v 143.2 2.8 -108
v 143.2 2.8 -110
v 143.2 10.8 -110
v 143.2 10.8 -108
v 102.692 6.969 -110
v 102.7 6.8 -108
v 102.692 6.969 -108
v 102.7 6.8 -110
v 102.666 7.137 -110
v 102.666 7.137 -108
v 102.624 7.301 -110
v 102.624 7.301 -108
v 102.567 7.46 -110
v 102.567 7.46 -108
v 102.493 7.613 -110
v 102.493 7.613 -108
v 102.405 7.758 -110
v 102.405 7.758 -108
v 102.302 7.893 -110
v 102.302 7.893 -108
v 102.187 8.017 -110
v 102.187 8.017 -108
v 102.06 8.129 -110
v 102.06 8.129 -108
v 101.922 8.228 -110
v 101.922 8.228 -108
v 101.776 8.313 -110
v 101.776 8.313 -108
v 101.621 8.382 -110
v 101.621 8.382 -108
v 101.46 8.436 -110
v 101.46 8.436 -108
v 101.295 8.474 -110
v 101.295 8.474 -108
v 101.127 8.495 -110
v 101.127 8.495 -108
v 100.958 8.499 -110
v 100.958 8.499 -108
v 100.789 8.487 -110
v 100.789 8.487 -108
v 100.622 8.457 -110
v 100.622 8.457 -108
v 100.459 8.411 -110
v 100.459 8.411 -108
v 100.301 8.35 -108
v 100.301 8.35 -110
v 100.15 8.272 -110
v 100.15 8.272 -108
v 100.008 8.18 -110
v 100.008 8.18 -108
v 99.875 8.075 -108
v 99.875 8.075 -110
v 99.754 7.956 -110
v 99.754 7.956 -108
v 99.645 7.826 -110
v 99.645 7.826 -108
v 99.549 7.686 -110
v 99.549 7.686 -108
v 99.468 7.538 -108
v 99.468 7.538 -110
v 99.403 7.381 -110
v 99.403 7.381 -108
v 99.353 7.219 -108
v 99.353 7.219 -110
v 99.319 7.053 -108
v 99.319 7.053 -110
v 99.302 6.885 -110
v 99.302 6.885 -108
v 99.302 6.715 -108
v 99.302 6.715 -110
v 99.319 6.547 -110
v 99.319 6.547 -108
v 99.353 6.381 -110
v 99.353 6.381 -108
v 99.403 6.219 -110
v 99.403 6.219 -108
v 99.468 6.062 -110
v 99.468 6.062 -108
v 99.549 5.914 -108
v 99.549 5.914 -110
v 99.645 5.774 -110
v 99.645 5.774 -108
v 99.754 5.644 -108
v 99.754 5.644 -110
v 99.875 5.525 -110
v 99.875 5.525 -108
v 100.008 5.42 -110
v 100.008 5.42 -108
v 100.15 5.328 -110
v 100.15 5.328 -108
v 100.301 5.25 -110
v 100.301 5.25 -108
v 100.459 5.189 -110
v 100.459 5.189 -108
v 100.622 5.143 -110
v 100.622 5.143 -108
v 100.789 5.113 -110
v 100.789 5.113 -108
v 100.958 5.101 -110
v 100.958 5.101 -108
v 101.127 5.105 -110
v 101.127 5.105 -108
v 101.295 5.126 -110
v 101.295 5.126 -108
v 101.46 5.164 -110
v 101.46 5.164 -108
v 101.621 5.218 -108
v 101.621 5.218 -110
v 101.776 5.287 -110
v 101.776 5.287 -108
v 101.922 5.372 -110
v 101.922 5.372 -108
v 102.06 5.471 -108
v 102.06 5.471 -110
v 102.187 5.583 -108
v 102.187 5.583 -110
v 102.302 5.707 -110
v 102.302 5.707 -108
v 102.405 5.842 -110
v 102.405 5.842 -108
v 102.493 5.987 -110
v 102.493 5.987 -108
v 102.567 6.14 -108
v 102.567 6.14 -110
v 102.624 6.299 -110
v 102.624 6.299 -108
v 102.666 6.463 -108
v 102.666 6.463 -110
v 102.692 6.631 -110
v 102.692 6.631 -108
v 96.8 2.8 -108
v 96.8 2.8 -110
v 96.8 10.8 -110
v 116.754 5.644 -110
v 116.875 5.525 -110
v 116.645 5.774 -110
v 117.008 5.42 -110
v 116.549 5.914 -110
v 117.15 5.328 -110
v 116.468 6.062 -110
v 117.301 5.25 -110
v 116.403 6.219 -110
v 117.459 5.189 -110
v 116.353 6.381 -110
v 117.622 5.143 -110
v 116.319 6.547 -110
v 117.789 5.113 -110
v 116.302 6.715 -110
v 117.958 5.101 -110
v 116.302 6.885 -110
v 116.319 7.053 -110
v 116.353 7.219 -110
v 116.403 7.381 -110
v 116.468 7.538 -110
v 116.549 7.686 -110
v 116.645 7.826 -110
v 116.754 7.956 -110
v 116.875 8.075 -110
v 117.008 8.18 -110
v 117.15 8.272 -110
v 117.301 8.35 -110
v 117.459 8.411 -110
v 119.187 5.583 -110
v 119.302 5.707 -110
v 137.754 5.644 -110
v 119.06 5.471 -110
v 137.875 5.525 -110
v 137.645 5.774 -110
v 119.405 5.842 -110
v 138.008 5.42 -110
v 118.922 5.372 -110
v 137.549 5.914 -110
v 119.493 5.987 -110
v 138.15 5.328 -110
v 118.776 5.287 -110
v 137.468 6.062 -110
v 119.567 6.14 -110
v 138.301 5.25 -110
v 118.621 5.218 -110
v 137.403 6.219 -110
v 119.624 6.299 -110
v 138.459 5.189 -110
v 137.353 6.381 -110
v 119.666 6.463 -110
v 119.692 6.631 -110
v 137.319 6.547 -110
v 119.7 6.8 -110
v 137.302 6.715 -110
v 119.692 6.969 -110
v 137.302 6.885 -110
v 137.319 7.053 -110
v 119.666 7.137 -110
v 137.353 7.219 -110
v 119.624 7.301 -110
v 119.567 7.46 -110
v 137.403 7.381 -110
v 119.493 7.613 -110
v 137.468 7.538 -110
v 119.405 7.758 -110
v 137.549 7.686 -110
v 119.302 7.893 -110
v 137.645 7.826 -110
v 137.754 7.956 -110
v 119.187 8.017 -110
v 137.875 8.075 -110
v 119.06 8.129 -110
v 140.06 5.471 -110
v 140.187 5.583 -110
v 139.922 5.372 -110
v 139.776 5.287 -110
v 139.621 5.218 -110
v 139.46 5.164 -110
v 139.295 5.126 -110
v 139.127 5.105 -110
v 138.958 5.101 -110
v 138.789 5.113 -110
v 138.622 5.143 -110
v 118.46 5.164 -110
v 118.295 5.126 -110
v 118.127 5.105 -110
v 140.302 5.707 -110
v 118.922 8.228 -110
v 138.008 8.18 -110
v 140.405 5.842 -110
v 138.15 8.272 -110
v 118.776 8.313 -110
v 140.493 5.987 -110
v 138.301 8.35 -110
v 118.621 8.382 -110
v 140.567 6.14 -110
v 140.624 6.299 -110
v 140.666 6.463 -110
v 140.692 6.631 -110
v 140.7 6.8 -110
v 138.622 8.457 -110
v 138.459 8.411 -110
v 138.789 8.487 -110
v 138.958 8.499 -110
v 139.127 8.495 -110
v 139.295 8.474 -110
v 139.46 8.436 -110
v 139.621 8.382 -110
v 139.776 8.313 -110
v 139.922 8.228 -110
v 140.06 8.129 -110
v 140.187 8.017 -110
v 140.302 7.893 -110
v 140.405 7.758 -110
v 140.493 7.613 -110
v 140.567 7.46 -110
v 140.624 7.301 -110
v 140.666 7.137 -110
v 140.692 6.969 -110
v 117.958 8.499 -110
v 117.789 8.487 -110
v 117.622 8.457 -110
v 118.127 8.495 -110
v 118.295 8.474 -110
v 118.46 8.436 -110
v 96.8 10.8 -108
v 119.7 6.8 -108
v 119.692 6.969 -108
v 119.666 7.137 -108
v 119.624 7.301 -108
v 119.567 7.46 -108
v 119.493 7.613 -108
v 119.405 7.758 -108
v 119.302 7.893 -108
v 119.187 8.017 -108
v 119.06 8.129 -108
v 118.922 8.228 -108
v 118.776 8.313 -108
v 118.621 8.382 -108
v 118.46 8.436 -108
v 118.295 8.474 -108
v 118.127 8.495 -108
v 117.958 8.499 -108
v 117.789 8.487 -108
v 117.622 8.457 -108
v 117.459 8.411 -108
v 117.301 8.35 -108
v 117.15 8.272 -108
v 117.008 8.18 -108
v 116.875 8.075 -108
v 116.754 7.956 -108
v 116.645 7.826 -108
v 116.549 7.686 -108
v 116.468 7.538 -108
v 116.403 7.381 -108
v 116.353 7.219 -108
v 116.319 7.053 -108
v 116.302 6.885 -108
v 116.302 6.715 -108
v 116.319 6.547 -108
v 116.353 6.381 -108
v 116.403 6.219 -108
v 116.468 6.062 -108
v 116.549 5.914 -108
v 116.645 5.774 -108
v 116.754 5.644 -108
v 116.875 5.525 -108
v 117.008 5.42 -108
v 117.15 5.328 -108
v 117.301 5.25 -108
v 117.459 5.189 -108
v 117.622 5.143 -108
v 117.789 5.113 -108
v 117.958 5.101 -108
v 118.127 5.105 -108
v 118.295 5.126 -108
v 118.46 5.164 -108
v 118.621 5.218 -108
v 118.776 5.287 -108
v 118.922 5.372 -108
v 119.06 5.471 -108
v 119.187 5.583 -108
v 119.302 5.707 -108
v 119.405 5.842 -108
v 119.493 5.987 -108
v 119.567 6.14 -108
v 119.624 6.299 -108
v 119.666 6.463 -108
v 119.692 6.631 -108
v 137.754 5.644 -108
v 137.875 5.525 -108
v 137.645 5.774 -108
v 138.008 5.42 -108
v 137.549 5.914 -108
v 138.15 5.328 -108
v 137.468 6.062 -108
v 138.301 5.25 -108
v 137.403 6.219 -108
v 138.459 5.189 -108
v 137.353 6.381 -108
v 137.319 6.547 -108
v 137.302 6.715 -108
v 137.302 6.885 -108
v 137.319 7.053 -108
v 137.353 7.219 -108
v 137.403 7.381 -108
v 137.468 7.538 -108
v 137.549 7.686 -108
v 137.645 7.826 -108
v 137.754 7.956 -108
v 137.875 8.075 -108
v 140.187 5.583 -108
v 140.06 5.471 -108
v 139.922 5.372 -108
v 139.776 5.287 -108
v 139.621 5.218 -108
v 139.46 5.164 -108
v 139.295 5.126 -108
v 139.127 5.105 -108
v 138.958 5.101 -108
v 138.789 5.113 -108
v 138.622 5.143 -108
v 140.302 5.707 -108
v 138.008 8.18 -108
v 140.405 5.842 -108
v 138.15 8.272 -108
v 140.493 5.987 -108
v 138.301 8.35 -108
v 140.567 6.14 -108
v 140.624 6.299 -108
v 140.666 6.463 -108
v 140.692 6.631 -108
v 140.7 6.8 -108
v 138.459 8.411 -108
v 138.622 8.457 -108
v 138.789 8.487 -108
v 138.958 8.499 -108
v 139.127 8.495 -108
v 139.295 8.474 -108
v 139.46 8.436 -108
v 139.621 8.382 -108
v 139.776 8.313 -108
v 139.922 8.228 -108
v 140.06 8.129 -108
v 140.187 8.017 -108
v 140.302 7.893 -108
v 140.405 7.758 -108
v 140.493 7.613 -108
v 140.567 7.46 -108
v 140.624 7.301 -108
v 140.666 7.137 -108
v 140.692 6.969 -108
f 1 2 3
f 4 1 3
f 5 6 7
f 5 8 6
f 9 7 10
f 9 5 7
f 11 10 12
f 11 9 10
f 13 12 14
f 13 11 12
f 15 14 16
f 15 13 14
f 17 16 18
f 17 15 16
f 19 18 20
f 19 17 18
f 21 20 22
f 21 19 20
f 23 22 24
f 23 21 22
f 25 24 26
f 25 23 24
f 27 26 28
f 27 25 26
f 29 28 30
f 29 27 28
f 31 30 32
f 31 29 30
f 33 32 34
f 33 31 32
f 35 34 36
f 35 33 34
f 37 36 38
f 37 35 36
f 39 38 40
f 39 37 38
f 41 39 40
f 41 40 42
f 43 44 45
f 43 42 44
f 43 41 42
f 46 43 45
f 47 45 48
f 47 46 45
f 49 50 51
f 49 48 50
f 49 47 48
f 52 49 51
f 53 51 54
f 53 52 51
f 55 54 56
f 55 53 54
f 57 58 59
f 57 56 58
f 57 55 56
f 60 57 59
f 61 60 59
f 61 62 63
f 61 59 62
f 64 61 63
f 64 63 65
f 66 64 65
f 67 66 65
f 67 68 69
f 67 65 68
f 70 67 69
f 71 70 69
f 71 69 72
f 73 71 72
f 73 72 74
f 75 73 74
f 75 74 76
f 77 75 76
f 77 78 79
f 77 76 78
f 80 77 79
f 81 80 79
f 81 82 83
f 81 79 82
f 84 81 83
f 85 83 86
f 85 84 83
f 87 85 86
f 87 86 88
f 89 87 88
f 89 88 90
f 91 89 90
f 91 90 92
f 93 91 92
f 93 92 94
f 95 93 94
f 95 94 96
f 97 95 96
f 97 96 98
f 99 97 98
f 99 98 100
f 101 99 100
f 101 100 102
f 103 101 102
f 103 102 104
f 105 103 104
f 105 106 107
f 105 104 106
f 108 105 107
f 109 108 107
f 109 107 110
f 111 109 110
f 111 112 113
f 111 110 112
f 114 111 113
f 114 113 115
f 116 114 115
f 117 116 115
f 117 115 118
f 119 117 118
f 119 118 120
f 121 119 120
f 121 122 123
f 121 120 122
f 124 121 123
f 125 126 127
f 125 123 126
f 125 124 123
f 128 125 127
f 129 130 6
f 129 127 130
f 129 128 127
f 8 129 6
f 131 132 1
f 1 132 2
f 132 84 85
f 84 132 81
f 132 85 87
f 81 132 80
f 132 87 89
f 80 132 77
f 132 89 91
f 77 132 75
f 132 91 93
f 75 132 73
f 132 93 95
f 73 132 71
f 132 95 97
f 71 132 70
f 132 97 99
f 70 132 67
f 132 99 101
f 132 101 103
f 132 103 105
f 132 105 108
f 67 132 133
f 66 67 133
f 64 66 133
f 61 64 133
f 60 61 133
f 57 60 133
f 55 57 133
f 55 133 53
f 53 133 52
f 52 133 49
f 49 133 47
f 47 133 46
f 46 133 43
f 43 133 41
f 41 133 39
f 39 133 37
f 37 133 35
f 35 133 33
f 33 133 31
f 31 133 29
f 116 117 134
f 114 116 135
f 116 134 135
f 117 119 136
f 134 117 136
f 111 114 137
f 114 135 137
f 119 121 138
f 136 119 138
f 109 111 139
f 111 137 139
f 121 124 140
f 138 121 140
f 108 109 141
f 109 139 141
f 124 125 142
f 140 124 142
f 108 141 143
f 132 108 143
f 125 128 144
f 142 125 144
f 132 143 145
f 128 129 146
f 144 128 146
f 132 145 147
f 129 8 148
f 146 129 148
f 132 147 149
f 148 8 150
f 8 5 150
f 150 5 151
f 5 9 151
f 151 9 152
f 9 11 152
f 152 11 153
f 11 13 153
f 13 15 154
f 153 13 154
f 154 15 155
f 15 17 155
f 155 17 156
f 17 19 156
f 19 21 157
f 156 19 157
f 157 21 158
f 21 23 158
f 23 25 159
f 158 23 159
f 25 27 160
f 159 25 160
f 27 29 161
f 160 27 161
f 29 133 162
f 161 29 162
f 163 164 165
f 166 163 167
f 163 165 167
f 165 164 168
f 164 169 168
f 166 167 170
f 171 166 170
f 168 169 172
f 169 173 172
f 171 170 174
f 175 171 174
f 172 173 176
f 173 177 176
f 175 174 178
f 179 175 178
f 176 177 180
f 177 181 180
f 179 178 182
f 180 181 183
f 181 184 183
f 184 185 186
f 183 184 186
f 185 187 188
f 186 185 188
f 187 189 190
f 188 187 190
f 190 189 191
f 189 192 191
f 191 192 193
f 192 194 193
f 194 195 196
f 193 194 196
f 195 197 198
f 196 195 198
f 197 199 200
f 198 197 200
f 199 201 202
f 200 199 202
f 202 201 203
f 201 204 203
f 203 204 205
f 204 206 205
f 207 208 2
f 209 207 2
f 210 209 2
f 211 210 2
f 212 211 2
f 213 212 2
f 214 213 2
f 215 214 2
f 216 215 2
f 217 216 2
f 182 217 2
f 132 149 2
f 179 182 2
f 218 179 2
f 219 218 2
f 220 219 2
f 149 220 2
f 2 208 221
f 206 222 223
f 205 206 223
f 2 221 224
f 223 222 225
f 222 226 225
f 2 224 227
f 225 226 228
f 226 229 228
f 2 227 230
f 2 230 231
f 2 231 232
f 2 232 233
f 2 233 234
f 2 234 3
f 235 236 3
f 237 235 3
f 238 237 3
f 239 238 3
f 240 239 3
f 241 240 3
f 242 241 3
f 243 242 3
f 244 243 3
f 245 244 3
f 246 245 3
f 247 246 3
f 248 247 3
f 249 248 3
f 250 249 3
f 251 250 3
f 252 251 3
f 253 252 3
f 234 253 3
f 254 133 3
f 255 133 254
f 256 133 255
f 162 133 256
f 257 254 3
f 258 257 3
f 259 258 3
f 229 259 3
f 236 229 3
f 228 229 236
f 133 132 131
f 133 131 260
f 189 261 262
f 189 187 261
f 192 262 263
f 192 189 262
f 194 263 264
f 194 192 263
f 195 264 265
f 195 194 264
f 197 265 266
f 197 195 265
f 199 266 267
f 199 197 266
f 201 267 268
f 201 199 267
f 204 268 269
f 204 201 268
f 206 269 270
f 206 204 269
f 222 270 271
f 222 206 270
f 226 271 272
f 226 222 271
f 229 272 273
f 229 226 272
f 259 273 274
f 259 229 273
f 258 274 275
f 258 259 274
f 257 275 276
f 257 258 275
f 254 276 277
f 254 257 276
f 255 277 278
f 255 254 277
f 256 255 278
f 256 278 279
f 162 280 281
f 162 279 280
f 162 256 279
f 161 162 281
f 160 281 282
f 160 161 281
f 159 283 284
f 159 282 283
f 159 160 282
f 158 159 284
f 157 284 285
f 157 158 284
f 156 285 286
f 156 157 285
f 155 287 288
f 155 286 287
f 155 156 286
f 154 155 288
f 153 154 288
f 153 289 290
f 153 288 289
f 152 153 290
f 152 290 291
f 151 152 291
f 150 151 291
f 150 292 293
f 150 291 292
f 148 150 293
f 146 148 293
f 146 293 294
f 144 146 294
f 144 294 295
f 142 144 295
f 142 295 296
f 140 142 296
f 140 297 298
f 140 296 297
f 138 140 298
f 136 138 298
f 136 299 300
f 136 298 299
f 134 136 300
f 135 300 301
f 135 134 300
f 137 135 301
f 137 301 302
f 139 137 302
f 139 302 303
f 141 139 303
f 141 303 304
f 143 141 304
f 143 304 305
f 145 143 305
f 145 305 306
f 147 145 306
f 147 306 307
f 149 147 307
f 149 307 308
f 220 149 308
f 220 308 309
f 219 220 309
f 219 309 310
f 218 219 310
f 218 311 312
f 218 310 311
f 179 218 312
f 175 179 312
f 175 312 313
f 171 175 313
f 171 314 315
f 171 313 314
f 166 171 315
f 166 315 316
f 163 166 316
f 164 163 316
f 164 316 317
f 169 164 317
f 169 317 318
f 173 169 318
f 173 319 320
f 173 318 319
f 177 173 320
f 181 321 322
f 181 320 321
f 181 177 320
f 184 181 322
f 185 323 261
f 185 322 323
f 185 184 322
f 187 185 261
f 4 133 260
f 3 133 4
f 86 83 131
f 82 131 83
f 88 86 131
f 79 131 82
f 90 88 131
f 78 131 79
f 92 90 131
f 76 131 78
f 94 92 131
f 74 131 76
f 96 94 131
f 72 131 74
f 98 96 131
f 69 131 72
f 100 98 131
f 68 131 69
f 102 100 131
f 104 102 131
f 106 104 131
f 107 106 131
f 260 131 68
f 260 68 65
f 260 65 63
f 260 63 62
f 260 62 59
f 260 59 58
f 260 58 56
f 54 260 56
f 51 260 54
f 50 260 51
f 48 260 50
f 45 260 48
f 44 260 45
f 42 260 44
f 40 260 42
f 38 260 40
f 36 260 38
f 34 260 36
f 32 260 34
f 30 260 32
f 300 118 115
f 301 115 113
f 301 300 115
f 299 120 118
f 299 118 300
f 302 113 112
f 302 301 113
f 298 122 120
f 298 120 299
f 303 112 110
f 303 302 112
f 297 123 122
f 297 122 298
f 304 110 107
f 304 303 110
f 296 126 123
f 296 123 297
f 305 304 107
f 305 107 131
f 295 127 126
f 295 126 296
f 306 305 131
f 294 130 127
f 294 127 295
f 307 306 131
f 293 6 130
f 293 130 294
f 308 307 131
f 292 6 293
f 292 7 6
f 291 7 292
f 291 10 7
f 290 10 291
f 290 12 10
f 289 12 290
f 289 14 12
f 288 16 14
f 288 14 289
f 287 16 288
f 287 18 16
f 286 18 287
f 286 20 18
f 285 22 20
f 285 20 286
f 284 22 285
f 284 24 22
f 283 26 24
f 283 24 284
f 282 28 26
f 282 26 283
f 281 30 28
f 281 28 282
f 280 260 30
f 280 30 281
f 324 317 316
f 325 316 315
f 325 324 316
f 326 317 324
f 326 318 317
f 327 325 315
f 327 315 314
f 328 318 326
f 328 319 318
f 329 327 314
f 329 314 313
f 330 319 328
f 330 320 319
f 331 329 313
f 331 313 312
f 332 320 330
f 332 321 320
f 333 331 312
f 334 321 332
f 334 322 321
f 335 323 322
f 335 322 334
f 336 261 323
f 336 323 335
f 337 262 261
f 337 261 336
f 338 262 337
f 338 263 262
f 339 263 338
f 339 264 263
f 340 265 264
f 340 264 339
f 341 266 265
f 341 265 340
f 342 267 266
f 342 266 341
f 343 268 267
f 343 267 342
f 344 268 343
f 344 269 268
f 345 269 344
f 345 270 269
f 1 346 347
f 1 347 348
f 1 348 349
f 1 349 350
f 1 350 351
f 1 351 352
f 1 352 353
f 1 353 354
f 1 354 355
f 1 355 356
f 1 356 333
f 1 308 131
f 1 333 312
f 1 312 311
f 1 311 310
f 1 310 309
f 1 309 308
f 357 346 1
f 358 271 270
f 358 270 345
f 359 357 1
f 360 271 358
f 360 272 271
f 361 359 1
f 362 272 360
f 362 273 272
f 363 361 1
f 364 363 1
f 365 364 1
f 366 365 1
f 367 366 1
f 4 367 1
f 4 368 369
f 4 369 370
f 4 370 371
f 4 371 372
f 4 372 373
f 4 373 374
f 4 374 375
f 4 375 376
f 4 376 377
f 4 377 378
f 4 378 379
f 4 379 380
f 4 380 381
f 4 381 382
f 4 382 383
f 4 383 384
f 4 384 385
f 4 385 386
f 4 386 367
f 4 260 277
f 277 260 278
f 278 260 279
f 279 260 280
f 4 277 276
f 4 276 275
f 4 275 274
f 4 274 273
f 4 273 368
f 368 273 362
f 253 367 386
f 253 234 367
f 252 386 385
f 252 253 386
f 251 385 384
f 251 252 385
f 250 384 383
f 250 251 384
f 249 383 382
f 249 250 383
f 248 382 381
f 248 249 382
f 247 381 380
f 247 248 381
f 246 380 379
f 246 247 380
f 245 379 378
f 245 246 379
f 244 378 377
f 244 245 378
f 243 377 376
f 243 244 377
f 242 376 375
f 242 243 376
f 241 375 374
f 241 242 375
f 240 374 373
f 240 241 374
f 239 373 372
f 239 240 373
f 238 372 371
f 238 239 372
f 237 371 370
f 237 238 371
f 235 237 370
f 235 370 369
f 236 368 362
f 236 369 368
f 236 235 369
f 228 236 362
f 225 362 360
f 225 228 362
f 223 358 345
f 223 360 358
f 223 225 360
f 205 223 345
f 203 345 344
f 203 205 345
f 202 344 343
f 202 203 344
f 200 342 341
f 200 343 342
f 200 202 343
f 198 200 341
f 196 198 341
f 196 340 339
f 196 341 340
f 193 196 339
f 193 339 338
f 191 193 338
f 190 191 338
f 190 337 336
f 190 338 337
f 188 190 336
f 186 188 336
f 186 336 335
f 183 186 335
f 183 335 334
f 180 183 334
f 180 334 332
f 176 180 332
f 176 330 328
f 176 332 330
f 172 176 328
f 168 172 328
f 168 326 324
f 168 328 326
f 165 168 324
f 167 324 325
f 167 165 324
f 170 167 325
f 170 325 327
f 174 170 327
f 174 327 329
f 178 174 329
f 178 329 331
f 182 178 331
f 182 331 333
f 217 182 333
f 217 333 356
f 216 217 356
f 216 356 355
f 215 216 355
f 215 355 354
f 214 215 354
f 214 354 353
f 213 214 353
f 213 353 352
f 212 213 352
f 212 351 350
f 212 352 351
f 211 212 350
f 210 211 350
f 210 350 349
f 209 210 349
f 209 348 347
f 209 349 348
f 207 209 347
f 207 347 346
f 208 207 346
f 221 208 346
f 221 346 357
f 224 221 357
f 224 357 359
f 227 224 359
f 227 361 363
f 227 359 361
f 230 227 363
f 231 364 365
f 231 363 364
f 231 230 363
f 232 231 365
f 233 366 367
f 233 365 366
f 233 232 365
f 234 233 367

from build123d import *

# Parameters (mm, degrees)
CYLINDER005_R     = 1.7
CYLINDER005_DEPTH = 30
CYLINDER003_R     = 1.7
CYLINDER003_DEPTH = 30
CYLINDER001_R     = 1.7
CYLINDER001_DEPTH = 30
BOX014_W          = 46.4
BOX014_H          = 8
BOX014_DEPTH      = 2


with BuildPart() as cylinder005:
    # Cylinder005 → Cylinder005 (new body)
    with BuildSketch(Plane(origin=(139, 6.8, -127), x_dir=(1, 0, 0), z_dir=(0, 0, 1))):
        Circle(CYLINDER005_R)
    extrude(amount=CYLINDER005_DEPTH)


with BuildPart() as cylinder003:
    # Cylinder003 → Cylinder003 (new body)
    with BuildSketch(Plane(origin=(118, 6.8, -127), x_dir=(1, 0, 0), z_dir=(0, 0, 1))):
        Circle(CYLINDER003_R)
    extrude(amount=CYLINDER003_DEPTH)


with BuildPart() as cylinder001:
    # Cylinder001 → Cylinder001 (new body)
    with BuildSketch(Plane(origin=(101, 6.8, -127), x_dir=(1, 0, 0), z_dir=(0, 0, 1))):
        Circle(CYLINDER001_R)
    extrude(amount=CYLINDER001_DEPTH)


with BuildPart() as cut008:
    # Box014 → Box014 (new body)
    with BuildSketch(Plane(origin=(96.8, 2.8, -110), x_dir=(1, 0, 0), z_dir=(0, 0, 1))):
        with Locations((23.2, 4)):
            Rectangle(BOX014_W, BOX014_H)
    extrude(amount=BOX014_DEPTH)

    # Cut006: cut Cylinder001
    add(cylinder001.part, mode=Mode.SUBTRACT)

    # Cut007: cut Cylinder003
    add(cylinder003.part, mode=Mode.SUBTRACT)

    # Cut008: cut Cylinder005
    add(cylinder005.part, mode=Mode.SUBTRACT)


solid = cut008.part
